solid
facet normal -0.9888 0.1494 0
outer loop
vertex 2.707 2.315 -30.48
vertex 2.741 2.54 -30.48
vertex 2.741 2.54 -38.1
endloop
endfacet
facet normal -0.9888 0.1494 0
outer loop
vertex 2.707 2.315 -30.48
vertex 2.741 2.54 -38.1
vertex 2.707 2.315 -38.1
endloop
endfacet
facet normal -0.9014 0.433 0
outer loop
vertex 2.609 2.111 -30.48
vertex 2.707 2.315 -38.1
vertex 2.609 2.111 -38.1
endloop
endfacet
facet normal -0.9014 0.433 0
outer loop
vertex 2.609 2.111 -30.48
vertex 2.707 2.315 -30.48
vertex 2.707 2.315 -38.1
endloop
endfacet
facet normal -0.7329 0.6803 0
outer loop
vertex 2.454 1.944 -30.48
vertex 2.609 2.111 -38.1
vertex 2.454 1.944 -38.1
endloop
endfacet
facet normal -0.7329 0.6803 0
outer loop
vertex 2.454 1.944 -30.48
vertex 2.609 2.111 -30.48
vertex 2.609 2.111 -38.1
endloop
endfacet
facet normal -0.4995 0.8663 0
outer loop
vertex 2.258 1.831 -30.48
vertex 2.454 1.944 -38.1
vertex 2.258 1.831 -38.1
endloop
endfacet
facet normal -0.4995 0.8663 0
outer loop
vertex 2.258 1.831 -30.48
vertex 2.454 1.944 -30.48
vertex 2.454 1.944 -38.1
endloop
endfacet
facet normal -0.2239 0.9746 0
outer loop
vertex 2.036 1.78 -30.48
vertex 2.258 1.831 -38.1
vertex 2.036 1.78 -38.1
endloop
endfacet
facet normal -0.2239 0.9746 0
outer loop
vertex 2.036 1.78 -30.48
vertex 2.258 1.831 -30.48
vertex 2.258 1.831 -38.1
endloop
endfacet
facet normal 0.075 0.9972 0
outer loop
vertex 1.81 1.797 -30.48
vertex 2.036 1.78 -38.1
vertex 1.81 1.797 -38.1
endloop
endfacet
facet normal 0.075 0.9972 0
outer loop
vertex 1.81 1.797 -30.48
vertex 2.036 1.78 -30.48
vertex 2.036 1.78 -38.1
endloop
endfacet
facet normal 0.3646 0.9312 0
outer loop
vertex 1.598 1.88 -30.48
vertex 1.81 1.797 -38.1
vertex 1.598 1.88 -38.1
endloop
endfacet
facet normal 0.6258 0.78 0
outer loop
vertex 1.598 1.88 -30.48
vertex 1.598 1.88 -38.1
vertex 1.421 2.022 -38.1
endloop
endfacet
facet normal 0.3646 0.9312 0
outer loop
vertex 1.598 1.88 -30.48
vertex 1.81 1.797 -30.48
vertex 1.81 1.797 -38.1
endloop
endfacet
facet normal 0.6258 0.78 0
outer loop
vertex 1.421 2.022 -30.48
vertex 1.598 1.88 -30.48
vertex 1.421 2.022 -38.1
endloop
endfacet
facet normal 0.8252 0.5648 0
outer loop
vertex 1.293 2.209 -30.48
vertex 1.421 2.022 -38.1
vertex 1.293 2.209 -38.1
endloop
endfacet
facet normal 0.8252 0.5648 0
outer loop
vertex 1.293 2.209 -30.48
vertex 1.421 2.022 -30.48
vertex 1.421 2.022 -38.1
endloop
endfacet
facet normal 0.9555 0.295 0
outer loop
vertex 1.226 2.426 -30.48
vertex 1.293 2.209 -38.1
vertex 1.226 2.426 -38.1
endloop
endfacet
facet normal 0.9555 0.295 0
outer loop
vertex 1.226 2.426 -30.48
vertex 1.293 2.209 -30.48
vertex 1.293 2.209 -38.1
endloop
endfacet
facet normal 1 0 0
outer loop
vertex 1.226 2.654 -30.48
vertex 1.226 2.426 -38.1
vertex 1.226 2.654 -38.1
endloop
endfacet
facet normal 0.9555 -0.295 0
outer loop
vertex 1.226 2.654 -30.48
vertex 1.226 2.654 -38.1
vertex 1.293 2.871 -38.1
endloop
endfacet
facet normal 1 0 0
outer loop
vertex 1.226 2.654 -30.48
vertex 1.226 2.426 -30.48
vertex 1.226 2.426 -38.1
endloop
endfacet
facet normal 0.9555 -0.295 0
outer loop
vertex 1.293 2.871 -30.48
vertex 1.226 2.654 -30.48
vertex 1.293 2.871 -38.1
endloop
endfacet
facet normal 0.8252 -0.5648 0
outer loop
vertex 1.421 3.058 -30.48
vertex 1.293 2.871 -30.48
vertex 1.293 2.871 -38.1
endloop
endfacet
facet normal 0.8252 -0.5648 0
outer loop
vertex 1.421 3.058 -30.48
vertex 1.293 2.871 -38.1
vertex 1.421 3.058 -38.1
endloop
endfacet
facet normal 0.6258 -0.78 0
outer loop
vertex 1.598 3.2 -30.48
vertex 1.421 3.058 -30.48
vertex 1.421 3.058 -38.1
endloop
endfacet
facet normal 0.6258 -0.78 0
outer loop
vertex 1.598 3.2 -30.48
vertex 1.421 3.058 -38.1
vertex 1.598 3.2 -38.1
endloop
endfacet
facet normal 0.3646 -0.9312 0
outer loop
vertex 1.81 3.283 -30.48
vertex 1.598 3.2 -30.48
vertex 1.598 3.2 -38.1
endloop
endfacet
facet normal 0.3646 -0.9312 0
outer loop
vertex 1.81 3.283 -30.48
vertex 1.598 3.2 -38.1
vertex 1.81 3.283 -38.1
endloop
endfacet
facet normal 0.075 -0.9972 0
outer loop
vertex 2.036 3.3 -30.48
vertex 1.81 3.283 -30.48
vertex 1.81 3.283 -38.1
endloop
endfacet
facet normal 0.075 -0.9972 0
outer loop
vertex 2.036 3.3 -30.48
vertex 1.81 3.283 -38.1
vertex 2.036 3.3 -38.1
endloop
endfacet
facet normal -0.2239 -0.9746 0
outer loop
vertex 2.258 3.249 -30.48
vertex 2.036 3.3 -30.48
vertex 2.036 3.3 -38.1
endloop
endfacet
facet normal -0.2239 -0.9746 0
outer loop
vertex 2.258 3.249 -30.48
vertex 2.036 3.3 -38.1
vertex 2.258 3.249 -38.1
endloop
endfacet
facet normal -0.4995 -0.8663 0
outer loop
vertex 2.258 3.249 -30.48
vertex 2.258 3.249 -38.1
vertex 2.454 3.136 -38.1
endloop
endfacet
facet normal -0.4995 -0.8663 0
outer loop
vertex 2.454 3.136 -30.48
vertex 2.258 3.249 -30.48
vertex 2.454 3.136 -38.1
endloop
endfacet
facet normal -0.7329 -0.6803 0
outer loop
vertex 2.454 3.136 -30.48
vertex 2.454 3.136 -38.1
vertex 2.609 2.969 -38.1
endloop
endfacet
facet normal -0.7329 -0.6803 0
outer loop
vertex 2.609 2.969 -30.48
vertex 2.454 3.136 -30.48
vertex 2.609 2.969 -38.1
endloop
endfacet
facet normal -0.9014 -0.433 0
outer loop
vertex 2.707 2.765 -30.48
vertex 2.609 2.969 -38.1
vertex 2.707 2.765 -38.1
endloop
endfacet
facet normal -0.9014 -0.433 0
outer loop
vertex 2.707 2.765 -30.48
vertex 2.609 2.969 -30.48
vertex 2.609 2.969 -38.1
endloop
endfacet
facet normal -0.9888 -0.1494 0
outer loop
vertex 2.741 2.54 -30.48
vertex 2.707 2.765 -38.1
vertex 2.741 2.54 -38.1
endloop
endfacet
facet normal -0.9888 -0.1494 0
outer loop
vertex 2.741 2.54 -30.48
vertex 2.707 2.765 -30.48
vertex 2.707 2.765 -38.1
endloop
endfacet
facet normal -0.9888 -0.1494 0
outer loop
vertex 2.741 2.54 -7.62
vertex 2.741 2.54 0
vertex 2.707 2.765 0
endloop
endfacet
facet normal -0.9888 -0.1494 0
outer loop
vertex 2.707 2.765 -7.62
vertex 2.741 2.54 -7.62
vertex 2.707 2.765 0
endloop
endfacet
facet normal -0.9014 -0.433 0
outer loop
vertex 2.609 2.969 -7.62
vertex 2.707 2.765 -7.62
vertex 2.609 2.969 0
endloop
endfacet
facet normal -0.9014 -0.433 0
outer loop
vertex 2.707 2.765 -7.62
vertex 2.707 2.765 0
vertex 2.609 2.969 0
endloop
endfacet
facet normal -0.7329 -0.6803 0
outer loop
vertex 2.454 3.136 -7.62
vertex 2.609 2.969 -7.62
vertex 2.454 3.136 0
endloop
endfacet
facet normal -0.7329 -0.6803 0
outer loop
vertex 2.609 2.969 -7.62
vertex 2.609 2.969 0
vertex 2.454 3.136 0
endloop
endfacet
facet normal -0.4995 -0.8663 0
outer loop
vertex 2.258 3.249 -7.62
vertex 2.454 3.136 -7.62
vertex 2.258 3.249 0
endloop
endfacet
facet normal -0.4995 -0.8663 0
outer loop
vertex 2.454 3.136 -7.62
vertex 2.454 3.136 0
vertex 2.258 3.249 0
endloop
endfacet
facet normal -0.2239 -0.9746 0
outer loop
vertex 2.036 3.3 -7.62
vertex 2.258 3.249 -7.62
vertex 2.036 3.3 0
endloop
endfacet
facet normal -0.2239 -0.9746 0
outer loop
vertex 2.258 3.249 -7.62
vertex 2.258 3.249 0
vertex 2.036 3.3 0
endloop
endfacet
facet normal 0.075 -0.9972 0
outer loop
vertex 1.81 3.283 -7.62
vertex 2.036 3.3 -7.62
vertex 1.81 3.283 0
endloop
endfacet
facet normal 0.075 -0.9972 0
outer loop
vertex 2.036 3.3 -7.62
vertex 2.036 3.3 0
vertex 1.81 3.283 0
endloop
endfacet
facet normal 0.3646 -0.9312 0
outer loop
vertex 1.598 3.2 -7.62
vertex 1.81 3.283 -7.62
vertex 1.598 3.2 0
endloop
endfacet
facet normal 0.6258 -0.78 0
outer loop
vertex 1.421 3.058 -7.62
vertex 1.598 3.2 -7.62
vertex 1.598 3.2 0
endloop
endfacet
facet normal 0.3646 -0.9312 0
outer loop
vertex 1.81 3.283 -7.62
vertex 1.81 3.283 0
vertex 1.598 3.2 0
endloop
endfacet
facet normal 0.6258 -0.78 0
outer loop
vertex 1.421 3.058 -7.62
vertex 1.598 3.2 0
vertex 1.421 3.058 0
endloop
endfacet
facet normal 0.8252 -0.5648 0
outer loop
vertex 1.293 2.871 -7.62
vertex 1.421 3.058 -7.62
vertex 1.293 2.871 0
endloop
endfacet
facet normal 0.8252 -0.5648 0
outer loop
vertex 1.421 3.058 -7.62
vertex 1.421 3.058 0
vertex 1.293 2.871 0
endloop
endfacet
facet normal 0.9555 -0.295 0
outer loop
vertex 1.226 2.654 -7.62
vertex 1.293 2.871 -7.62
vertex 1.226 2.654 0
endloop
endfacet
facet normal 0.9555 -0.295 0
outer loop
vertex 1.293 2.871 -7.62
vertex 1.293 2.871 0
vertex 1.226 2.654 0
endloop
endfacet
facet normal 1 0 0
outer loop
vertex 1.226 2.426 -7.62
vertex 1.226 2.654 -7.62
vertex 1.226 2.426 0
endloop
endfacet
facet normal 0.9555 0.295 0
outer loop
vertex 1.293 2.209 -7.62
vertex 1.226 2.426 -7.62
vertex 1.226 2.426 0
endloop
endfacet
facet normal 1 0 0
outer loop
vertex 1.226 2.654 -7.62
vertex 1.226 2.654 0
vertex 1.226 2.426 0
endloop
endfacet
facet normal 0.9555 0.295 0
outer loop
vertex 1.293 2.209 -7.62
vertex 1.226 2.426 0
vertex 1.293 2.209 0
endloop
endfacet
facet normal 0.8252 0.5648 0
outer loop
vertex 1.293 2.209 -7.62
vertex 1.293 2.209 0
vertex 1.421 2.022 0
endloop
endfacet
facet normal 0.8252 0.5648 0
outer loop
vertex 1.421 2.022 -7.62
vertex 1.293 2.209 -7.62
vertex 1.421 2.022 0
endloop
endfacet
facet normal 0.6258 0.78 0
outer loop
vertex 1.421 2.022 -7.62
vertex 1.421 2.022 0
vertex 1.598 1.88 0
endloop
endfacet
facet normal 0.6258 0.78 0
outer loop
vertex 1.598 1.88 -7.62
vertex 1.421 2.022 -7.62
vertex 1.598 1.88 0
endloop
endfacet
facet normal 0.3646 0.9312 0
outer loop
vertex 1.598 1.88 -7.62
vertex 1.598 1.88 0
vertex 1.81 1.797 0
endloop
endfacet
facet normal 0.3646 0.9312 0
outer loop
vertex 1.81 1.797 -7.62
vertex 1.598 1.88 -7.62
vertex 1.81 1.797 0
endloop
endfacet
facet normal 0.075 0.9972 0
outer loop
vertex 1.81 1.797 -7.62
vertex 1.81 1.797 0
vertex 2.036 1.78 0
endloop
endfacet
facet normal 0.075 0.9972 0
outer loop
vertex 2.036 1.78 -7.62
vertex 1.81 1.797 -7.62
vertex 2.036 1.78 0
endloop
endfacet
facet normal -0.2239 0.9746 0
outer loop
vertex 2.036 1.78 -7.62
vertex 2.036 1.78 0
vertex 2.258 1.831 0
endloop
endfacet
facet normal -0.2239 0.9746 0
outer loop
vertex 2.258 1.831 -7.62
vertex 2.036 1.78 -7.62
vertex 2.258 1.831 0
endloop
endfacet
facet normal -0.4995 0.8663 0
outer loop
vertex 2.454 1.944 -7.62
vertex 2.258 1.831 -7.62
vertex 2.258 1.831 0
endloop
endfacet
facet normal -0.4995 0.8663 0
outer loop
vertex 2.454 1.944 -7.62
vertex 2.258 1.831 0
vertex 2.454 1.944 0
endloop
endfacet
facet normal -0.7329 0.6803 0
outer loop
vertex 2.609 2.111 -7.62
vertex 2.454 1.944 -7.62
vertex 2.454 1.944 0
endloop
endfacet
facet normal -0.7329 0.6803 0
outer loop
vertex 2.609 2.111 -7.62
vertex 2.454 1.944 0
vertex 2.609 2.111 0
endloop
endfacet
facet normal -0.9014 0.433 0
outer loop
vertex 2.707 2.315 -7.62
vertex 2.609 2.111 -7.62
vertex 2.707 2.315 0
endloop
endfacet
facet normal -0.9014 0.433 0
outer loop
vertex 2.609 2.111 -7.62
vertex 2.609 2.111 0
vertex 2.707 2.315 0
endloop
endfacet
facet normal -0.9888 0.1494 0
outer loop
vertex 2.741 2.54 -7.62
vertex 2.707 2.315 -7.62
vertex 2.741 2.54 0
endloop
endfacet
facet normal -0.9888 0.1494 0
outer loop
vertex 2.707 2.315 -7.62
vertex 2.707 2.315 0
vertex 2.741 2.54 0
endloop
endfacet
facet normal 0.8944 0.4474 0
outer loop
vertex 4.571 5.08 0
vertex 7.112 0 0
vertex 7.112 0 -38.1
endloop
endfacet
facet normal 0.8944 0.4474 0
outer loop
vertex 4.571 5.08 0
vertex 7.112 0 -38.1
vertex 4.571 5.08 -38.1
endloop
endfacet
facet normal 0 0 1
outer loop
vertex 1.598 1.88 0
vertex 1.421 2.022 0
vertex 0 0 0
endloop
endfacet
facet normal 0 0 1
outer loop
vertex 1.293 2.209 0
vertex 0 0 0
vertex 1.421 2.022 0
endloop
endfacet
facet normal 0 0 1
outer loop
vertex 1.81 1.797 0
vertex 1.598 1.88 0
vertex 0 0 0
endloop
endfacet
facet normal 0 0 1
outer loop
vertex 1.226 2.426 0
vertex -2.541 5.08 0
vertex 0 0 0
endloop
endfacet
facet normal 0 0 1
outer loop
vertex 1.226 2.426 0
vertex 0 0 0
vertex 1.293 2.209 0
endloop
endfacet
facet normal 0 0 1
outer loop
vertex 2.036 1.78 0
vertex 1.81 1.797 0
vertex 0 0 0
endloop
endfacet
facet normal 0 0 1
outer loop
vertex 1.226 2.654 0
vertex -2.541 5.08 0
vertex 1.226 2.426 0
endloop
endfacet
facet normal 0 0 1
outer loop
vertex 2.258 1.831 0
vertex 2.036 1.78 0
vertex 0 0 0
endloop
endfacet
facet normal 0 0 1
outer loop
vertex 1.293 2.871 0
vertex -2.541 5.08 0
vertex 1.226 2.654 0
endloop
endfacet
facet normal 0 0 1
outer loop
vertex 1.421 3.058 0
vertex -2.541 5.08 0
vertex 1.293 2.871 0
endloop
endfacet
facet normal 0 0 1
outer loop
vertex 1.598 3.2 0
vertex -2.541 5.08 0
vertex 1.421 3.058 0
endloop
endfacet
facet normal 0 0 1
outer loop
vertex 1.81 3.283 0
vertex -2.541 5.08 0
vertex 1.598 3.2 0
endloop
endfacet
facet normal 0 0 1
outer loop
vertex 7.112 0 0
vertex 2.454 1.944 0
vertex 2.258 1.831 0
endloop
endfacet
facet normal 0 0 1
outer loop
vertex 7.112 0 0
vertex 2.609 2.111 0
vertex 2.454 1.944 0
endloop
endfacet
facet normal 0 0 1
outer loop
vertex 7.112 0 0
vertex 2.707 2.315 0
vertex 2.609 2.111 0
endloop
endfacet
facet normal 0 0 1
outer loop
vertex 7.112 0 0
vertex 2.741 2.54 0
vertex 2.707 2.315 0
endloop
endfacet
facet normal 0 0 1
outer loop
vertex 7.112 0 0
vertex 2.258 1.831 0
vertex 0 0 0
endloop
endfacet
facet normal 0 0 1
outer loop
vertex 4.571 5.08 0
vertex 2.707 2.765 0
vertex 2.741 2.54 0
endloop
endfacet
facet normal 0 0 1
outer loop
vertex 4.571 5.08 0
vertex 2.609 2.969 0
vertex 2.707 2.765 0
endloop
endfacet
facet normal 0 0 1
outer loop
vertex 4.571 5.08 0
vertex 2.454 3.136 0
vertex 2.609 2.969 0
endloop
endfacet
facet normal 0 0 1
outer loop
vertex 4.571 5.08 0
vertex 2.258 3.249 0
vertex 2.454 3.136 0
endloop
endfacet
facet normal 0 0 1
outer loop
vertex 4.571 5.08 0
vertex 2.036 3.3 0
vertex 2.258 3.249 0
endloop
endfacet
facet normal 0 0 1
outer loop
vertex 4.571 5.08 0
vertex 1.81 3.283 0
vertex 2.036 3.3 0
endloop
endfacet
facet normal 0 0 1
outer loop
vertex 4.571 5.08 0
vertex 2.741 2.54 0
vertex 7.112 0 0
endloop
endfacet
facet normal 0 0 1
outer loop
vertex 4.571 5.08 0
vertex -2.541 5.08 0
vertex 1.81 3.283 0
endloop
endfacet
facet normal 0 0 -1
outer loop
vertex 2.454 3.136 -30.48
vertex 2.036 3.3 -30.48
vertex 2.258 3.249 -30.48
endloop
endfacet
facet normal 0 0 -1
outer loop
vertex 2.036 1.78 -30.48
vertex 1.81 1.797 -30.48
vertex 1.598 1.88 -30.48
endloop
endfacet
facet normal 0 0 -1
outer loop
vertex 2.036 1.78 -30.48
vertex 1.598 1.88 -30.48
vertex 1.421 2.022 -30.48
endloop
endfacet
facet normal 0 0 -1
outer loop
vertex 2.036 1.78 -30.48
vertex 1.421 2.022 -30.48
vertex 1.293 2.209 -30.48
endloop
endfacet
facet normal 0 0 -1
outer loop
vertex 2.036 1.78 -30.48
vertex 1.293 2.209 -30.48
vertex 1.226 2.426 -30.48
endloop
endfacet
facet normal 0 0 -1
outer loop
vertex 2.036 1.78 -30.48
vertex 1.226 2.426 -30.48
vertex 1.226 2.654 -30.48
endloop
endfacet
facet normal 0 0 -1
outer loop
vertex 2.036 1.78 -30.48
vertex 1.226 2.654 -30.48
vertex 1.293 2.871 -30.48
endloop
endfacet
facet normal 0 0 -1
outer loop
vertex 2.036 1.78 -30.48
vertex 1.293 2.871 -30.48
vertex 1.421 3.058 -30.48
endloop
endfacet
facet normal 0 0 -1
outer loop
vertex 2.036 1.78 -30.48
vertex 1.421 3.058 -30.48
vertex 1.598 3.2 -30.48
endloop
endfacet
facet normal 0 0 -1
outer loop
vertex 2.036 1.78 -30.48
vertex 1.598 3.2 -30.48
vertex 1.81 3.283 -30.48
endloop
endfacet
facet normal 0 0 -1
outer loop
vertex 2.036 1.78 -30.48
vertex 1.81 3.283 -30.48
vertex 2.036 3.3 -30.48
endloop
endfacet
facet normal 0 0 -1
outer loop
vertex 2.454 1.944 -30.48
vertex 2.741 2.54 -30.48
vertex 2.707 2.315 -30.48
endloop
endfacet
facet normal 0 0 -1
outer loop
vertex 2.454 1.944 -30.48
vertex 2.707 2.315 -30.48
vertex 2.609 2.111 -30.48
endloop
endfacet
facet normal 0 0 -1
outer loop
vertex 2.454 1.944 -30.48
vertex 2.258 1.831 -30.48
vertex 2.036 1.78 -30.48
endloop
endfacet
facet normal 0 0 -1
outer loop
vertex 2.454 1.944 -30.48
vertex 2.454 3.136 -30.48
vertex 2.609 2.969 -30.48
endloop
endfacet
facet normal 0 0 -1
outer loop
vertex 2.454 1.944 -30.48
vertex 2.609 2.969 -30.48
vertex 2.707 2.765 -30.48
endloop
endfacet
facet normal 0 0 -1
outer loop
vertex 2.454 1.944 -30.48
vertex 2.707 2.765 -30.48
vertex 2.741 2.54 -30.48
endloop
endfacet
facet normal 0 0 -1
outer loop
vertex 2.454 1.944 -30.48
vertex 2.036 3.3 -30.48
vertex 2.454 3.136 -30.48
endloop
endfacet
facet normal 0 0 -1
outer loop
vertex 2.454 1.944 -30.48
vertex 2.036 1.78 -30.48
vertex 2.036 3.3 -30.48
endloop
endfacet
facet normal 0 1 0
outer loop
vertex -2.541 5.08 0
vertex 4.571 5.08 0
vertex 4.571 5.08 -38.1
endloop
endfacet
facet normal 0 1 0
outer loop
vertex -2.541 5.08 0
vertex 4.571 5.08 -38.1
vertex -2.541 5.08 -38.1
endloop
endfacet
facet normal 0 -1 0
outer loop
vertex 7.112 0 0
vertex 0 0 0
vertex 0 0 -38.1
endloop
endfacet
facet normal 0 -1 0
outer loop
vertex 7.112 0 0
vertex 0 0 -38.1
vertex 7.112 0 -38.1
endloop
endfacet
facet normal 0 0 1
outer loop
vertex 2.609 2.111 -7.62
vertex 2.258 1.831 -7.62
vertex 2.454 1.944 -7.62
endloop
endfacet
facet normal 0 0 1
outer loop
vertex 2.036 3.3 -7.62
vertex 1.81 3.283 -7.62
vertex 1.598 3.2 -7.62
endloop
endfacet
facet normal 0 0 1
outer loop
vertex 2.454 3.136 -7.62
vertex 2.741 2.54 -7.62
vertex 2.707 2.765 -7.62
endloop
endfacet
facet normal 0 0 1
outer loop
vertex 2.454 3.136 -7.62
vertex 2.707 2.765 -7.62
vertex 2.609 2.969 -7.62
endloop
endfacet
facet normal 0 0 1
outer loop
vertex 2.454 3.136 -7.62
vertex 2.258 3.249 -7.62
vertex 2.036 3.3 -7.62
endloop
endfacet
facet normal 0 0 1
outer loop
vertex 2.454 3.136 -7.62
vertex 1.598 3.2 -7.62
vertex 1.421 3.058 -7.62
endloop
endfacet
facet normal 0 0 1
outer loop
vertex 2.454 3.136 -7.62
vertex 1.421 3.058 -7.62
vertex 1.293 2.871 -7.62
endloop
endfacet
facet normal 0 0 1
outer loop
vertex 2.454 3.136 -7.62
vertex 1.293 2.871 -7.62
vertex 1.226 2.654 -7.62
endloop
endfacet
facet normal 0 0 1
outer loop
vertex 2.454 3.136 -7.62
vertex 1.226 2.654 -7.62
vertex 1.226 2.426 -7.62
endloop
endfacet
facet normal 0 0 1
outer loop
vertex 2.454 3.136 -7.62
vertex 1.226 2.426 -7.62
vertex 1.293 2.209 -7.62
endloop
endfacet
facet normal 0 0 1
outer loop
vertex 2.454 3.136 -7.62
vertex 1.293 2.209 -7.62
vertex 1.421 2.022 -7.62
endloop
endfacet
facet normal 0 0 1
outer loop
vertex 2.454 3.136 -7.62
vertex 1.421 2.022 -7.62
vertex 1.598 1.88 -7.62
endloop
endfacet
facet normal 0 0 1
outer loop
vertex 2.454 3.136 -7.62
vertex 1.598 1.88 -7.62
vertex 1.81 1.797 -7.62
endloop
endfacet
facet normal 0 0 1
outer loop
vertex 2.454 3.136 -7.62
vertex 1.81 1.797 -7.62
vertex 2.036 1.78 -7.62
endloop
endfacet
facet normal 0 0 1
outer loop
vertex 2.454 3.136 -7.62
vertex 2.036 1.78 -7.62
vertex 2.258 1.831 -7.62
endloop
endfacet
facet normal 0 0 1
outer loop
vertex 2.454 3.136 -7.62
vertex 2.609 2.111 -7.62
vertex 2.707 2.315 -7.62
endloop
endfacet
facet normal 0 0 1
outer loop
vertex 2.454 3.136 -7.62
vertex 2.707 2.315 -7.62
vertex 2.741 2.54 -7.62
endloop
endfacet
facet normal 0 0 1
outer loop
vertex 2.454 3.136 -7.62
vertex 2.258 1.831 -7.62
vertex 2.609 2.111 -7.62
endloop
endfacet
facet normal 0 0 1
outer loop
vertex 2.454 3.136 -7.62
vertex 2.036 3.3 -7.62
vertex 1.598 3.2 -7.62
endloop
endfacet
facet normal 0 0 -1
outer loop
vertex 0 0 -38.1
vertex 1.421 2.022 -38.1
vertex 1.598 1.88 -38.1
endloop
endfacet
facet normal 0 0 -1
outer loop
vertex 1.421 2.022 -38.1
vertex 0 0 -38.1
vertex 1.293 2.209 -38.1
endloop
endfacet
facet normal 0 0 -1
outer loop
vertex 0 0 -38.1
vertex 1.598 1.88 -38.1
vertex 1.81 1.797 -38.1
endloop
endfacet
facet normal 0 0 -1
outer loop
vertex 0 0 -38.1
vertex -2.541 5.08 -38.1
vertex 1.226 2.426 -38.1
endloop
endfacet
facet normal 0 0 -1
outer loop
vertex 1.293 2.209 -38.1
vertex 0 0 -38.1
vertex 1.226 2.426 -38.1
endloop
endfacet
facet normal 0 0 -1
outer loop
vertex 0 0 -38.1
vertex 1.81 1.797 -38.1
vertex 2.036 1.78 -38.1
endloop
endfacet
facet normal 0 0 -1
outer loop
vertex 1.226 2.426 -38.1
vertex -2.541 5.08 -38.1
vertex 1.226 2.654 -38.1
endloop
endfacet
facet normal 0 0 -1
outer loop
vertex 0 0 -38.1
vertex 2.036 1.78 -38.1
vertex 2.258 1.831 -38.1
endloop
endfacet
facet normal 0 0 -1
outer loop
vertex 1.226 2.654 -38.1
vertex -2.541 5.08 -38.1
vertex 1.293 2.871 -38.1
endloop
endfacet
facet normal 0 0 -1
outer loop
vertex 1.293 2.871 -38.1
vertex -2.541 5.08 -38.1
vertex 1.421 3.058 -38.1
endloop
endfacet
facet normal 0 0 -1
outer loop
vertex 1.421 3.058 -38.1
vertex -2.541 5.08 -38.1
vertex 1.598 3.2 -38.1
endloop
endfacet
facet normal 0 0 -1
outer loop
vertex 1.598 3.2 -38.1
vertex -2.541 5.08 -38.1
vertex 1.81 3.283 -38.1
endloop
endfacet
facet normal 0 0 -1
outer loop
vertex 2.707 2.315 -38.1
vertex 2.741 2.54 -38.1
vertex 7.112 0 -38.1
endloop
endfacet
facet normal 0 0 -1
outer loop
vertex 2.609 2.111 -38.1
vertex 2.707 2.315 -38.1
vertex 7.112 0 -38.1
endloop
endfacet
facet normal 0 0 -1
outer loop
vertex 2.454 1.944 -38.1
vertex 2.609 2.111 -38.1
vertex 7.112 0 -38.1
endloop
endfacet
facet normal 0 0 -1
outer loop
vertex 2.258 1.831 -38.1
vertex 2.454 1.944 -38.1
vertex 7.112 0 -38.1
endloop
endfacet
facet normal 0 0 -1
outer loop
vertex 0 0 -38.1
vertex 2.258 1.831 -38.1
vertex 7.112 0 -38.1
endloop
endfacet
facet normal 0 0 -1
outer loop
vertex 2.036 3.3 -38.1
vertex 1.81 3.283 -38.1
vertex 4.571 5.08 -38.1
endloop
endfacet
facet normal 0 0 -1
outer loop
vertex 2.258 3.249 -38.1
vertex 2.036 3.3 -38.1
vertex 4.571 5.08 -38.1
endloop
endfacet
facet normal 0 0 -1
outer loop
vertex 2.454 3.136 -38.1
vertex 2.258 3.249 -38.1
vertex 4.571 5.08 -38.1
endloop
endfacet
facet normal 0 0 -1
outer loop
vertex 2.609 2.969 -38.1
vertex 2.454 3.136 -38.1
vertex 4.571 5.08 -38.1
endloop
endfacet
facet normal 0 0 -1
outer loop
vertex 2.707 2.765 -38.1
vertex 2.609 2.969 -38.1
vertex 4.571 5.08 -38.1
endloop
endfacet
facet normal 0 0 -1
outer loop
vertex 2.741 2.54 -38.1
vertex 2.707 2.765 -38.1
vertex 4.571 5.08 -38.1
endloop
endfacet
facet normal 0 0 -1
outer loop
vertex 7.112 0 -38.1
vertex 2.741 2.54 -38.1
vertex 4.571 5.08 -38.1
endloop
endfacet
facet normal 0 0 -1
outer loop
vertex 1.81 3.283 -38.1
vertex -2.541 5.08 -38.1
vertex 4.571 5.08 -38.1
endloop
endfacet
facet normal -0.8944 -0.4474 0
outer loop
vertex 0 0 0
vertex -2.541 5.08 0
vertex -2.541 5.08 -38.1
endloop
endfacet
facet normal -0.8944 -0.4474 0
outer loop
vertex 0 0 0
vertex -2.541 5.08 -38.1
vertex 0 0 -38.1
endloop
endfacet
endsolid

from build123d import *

# Parameters (mm, degrees)
BOSS_EXTRUDE1_DEPTH = 38.1
SKETCH2_R           = 0.762
CUT_EXTRUDE1_DEPTH  = 7.62
CUT_EXTRUDE2_START  = -7.62
SKETCH3_R           = 0.762
CUT_EXTRUDE2_DEPTH  = 7.62


with BuildPart() as part:
    # Sketch1 → Boss-Extrude1 (new body)
    with BuildSketch(Plane.XY):
        Polygon((0, 0), (7.112, 0), (4.571451506, 5.08), (-2.540548494, 5.08), align=None)
    extrude(amount=-BOSS_EXTRUDE1_DEPTH)

    # Sketch2 → Cut-Extrude1 (cut)
    with BuildSketch(Plane.XY):
        with Locations((1.979121083, 2.54)):
            Circle(SKETCH2_R)
    extrude(amount=-CUT_EXTRUDE1_DEPTH, mode=Mode.SUBTRACT)

    # Sketch3 → Cut-Extrude2 (cut)
    with BuildSketch(Plane(origin=(0, 0, -38.1), x_dir=(-1, 0, 0), z_dir=(0, 0, -1)).offset(CUT_EXTRUDE2_START)):
        with Locations(Location((-1.979121083, 2.54, 0), (0, 0, 180))):
            Circle(SKETCH3_R)
    extrude(amount=CUT_EXTRUDE2_DEPTH, mode=Mode.SUBTRACT)


solid = part.part
